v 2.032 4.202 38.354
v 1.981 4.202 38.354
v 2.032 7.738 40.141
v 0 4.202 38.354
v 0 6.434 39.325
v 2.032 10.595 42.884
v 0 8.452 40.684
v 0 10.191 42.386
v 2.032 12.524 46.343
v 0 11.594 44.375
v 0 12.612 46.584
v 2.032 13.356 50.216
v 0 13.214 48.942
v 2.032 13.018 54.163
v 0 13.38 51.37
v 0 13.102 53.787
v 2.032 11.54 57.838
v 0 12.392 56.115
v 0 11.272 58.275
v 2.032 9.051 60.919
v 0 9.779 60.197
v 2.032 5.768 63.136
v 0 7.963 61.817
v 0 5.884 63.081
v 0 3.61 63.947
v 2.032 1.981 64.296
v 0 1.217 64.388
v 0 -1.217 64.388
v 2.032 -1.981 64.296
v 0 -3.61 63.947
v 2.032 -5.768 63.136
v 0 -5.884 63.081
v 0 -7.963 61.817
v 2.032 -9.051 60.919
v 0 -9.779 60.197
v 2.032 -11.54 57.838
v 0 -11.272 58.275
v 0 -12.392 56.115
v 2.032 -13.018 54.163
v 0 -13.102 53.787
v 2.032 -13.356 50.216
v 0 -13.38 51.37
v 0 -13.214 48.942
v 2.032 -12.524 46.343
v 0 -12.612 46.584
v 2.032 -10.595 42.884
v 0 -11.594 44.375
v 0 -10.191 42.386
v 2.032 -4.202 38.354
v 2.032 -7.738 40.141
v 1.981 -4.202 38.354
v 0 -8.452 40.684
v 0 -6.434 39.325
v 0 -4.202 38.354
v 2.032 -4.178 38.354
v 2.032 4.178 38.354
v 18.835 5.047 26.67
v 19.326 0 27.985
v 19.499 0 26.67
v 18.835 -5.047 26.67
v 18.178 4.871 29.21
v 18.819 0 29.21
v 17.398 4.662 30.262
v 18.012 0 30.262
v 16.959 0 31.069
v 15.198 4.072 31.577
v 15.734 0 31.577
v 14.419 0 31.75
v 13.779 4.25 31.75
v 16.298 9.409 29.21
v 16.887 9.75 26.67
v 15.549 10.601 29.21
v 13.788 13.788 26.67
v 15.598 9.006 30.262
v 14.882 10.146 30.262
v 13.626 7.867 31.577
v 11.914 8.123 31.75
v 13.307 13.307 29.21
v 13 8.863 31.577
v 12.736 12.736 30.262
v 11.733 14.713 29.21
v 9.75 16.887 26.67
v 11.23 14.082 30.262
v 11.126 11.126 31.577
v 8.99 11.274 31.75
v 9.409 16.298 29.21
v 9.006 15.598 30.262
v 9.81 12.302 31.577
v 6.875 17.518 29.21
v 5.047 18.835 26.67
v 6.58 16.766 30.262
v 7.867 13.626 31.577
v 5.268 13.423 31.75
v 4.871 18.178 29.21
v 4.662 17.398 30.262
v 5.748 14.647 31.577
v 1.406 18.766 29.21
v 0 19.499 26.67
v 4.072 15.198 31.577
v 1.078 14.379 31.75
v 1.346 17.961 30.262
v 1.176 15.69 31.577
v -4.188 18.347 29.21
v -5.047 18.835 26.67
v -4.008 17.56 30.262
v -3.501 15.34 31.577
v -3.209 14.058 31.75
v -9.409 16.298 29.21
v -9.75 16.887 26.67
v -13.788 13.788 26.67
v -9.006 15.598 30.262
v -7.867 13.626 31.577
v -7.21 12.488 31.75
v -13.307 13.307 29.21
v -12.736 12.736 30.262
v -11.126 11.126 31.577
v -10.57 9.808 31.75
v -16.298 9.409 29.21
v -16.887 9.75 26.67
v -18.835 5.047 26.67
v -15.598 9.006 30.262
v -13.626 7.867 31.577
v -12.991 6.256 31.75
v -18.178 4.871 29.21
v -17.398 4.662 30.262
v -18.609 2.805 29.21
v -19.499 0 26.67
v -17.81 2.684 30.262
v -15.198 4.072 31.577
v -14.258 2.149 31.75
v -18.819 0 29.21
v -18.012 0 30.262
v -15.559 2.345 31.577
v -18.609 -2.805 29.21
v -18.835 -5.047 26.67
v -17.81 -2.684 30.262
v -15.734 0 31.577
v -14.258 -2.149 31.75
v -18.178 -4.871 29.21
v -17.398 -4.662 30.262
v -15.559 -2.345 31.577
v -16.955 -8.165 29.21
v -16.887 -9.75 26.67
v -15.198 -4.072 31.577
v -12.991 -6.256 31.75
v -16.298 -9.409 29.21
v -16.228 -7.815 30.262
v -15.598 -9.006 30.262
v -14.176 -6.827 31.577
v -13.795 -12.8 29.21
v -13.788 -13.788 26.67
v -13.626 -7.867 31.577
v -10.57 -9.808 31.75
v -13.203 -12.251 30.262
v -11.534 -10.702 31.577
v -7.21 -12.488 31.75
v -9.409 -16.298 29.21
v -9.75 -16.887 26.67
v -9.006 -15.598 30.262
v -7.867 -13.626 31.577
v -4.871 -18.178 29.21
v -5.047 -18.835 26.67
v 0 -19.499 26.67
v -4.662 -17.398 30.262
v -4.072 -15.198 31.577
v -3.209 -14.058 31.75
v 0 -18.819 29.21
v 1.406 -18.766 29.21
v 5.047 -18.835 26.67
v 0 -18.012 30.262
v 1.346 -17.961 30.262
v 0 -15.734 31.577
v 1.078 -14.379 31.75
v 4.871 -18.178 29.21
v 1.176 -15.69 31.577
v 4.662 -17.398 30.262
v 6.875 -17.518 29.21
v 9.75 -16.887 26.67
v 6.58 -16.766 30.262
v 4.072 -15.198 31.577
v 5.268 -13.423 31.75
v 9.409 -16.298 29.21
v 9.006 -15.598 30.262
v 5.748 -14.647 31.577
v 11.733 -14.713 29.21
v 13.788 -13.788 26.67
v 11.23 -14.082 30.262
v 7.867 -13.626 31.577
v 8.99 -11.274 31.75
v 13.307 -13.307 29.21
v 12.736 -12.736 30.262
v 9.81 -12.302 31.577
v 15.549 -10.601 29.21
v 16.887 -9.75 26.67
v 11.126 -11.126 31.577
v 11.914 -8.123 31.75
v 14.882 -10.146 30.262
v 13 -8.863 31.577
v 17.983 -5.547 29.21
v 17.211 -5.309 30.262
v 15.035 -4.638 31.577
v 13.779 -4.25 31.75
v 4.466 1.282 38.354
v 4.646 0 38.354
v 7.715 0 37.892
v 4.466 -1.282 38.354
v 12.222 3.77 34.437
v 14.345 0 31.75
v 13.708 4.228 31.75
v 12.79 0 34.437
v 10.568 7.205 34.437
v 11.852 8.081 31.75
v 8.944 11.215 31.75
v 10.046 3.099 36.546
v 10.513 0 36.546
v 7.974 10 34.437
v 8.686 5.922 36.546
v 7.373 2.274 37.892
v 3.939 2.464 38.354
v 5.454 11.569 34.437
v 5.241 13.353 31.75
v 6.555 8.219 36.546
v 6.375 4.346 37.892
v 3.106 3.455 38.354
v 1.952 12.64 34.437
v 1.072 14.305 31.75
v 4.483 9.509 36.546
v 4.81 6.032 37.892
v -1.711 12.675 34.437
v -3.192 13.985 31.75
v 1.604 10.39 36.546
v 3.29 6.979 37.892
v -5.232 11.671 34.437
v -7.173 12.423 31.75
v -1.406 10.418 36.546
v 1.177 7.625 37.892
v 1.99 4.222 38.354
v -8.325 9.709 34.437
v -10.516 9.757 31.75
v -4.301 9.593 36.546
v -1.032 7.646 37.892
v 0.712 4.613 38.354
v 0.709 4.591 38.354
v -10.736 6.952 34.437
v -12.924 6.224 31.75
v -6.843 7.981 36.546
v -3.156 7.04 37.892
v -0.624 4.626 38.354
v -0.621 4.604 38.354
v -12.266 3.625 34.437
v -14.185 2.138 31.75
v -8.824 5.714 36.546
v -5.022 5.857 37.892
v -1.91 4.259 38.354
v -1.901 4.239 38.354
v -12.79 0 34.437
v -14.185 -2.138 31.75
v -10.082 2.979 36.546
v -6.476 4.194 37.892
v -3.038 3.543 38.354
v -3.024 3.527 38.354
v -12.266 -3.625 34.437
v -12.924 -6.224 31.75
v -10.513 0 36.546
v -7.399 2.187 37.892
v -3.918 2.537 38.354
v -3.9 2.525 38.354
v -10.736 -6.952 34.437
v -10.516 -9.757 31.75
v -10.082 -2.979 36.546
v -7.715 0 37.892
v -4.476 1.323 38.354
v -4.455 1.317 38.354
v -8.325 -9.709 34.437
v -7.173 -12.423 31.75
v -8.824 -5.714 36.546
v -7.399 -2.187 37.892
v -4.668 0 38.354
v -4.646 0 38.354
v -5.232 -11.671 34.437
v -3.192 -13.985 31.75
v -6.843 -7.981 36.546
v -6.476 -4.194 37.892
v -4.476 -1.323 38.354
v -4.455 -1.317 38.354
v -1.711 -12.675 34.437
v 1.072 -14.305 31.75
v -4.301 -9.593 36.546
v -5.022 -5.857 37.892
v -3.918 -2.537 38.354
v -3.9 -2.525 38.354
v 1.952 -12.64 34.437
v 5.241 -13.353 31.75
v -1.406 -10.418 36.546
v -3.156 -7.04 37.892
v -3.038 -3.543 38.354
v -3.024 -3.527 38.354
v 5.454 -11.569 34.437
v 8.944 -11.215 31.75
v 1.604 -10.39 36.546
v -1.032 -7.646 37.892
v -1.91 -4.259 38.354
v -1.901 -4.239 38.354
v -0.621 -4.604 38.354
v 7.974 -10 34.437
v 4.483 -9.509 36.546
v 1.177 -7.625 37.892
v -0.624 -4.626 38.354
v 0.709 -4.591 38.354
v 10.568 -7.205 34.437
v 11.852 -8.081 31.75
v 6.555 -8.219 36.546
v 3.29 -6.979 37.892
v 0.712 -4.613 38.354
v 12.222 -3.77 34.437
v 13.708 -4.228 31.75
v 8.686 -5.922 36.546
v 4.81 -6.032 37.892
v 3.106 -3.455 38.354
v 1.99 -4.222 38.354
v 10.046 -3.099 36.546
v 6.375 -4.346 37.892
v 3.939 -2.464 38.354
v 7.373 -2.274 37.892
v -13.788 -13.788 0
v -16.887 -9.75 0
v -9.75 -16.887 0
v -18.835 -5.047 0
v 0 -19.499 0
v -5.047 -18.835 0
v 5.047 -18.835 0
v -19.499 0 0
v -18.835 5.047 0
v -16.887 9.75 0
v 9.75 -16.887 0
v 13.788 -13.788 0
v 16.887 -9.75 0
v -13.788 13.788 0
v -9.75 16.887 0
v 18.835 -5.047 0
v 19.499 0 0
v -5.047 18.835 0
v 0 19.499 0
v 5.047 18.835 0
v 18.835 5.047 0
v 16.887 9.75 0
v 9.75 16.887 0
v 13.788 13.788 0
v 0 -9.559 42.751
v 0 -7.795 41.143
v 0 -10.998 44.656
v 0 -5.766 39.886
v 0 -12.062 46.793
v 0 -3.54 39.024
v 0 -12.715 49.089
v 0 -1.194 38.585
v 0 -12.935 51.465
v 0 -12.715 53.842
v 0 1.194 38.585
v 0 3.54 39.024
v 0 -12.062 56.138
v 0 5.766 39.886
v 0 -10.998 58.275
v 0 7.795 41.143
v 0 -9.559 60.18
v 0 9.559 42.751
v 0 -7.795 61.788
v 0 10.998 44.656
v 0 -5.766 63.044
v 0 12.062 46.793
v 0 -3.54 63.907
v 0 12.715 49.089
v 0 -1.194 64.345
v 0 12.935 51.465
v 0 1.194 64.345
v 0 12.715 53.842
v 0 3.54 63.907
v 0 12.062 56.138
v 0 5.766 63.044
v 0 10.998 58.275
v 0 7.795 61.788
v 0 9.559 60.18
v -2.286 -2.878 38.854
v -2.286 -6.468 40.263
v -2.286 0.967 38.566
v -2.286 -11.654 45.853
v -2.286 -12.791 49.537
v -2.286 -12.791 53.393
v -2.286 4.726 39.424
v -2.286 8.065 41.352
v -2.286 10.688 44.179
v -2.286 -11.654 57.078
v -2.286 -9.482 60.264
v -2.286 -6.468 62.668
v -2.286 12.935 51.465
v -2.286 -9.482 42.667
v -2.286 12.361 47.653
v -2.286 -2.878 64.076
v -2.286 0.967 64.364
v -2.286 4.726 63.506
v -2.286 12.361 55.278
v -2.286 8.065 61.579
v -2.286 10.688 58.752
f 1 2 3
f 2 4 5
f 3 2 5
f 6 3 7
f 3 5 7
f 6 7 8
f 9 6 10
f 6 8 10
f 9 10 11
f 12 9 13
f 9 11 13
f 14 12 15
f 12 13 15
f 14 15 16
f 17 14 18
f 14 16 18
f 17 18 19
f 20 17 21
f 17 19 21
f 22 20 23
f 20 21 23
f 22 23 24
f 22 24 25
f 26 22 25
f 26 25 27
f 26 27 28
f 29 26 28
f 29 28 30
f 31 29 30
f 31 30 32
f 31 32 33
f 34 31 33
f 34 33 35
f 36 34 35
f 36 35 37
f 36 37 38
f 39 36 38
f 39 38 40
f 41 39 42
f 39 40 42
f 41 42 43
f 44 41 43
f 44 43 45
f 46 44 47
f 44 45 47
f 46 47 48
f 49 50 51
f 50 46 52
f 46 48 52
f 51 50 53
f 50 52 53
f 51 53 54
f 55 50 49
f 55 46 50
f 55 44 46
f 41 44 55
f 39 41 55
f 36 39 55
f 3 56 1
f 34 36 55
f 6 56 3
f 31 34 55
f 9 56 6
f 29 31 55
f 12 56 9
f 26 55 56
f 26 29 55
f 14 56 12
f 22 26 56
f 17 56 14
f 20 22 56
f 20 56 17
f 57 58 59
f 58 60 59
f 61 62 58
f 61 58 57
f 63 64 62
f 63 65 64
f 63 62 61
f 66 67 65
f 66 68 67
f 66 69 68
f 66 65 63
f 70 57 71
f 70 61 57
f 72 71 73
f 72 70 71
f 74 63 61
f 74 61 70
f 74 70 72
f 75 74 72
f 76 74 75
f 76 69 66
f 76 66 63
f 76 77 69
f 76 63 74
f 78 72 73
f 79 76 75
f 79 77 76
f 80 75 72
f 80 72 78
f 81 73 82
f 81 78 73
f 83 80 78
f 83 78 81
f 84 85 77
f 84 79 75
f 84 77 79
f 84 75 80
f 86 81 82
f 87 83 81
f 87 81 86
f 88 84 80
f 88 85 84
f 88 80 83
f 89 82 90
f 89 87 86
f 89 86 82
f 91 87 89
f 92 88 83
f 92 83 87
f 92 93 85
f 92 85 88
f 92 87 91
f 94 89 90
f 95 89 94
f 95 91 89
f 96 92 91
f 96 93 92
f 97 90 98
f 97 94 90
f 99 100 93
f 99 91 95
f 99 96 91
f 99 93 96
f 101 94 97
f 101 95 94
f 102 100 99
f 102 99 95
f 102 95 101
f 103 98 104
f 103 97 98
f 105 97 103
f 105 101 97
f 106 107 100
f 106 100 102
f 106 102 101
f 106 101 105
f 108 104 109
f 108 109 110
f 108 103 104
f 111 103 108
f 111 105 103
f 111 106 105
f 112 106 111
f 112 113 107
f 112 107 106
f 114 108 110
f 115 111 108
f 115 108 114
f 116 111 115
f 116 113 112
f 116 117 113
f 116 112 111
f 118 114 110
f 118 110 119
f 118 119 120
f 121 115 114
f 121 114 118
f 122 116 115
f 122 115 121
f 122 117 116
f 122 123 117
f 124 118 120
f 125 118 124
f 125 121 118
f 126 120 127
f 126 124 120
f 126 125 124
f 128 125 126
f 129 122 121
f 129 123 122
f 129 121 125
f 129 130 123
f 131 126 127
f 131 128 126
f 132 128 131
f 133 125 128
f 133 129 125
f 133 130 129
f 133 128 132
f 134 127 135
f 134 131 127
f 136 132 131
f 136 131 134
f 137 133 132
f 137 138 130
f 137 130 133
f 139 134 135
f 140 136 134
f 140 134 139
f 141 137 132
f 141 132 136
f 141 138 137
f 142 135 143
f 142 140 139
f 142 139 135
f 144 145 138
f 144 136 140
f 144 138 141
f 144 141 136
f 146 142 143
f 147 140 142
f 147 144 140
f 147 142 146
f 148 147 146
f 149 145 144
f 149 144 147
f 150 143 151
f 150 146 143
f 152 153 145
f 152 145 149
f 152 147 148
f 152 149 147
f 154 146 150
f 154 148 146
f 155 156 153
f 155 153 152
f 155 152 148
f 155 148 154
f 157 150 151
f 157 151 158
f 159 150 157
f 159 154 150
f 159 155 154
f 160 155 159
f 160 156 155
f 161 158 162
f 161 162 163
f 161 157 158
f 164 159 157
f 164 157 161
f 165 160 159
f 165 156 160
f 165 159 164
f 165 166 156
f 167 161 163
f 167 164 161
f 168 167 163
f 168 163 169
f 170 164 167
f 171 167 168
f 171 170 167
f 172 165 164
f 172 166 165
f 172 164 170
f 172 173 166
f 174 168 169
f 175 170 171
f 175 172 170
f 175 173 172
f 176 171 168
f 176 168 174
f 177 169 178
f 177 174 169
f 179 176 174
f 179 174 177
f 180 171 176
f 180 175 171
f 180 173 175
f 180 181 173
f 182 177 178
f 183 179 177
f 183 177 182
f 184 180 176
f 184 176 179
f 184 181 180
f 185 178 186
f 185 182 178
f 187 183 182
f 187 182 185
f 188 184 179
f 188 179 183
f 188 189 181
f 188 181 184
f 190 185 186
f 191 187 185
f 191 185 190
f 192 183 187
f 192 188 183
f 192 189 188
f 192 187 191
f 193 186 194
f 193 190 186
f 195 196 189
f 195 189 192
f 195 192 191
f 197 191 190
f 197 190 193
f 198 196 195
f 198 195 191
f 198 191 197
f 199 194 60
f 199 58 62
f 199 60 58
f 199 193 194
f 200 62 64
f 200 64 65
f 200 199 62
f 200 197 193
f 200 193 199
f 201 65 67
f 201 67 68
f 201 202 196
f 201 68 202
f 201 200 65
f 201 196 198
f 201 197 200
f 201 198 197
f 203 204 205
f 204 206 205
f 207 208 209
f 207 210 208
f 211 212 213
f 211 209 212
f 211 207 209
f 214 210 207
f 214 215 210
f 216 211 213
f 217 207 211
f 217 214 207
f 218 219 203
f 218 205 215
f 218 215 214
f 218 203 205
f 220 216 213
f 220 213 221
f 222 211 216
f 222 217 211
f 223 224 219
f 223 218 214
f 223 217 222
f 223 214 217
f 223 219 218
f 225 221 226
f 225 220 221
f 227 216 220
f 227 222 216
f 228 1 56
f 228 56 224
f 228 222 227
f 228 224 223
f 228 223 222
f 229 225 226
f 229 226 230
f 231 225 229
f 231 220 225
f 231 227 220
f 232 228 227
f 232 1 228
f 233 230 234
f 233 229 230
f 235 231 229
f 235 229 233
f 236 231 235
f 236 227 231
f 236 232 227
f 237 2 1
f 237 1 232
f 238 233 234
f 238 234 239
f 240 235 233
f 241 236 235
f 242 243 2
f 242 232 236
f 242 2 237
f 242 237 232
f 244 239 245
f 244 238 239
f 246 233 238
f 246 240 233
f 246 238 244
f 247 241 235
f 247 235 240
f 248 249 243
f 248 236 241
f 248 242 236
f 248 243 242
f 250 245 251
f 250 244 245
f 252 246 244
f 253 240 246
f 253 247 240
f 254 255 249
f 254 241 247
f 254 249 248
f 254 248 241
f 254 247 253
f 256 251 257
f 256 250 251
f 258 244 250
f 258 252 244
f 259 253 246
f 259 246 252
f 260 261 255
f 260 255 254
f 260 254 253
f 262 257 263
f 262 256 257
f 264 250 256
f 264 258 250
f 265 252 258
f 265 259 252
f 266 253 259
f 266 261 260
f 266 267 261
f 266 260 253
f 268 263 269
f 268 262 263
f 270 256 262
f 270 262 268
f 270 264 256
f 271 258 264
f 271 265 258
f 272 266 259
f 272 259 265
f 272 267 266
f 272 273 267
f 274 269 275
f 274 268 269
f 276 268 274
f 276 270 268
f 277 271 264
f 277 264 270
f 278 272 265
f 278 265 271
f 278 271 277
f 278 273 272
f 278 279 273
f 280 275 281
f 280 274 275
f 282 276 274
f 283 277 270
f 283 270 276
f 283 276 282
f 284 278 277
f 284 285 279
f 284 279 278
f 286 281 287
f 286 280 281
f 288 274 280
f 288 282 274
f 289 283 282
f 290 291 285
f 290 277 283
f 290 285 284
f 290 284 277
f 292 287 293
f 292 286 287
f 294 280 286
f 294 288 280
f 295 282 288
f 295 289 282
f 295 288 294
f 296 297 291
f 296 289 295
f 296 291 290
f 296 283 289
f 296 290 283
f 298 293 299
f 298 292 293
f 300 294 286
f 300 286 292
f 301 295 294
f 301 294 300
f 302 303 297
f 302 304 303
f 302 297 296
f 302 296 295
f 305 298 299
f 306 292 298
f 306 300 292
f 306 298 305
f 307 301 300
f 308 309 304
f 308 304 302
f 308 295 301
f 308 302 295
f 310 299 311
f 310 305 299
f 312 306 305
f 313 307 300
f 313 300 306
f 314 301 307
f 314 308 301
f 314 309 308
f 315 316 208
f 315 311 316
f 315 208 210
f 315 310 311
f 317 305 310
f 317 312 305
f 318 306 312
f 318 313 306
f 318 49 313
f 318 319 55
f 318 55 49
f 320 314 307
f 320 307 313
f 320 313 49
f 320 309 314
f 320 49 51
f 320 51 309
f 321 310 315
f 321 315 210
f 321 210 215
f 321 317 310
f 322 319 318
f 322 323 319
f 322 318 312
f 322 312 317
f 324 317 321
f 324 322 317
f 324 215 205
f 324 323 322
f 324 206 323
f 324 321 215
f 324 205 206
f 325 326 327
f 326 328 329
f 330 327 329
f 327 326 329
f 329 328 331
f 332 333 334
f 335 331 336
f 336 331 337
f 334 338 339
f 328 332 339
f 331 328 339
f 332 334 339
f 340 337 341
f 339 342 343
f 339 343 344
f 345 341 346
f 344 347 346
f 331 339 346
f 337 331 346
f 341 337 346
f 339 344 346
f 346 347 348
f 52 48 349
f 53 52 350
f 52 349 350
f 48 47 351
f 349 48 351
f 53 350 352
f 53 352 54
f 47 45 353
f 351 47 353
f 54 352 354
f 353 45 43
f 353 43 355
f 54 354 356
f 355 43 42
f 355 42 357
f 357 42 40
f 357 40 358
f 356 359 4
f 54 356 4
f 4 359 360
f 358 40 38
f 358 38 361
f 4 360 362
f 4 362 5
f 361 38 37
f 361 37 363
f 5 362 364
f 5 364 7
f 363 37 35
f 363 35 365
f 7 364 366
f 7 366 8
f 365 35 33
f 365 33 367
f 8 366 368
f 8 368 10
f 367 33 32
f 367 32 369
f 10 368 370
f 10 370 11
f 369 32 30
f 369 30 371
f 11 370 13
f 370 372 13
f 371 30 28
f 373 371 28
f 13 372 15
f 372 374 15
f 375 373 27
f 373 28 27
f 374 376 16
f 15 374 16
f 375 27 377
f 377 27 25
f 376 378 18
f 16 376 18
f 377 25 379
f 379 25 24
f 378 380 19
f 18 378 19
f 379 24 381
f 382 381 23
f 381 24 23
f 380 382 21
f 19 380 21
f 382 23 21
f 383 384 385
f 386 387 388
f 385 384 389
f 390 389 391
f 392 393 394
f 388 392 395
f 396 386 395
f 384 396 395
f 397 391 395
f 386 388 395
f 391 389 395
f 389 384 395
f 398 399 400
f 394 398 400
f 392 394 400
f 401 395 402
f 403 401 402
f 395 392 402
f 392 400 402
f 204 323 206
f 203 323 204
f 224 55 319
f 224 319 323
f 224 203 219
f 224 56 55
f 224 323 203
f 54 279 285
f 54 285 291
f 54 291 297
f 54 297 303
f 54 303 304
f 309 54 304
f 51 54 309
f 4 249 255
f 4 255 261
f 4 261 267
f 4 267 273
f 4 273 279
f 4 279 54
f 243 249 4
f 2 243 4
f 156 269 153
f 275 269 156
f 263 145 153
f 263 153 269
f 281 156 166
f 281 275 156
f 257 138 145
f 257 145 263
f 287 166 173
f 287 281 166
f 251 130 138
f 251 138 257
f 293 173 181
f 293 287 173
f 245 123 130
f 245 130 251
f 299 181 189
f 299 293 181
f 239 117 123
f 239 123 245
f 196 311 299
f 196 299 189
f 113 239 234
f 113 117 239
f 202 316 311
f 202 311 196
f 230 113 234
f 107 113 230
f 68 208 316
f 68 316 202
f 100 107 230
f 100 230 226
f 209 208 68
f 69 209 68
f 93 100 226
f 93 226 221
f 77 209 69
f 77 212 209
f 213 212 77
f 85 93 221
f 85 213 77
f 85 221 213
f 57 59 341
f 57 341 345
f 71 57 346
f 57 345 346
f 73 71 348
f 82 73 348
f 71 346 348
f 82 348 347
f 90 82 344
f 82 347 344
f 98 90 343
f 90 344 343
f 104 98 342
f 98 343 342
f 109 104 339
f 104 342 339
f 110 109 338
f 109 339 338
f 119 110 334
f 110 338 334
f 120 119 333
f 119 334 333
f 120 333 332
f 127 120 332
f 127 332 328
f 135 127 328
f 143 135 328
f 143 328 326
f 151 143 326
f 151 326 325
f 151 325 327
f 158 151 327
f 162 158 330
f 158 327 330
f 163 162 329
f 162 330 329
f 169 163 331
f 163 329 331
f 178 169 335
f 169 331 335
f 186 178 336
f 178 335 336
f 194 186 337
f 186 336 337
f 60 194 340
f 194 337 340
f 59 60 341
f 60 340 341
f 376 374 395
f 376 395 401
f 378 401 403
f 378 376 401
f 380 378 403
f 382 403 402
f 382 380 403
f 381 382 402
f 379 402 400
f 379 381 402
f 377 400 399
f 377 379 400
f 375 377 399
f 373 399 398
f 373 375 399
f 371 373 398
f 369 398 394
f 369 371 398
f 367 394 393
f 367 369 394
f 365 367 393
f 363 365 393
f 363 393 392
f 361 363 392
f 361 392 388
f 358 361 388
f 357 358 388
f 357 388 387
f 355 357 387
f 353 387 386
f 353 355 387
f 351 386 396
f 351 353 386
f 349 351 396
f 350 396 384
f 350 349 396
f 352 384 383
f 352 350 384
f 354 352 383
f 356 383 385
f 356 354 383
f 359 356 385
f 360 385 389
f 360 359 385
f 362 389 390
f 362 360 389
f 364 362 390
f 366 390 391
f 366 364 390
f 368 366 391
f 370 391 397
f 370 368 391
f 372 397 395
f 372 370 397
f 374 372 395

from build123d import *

# Parameters (mm, degrees)
F0_R     = 19.4994564254
F1_DEPTH = 31.75
F2_R     = 5.08
F3_R     = 14.3450562753
F4_DEPTH = 38.354
F6_R     = 13.3830864671
F7_DEPTH = 2.032
F8_R     = 12.9352143756
F9_DEPTH = 2.286


# Not quite as in the source:
# - a fillet or chamfer that OpenCascade refuses, or shapes differently, is made with other operations: its cross-section is extruded or revolved along the edge and cut away or added


with BuildPart() as f1:
    # F0 (on Top) → F1 (new body)
    with BuildSketch(Plane.XY):
        Circle(F0_R)
    extrude(amount=F1_DEPTH)

    # F2
    f2_edges = [f1.edges().sort_by_distance(p)[0] for p in [
        (-19.499456, 0, 31.75),
    ]]
    fillet(f2_edges, radius=F2_R)

    # F3 (on Top) → F4 (join)
    with BuildSketch(Plane.XY):
        Circle(F3_R)
    extrude(amount=F4_DEPTH)

    # F5: fillet of radius 10.4245741623 on 1 edges, made by hand

    # F5_s1 → F5_t2 (revolve, cut)
    with BuildSketch(Plane.XZ):
        with BuildLine():
            ThreePointArc((14.3450562753, 31.75), (10.5128533097, 36.5462583521), (4.6458315879, 38.354))
            Line((4.6458315879, 38.354), (14.3450562753, 38.354))
            Line((14.3450562753, 38.354), (14.3450562753, 31.75))
        make_face()
    revolve(axis=Axis((0, 0, 38.354), (0, 0, 1)), mode=Mode.SUBTRACT)

    # F6 (on Right) → F7 (join)
    with BuildSketch(Plane.YZ):
        with Locations((0, 51.0602071881)):
            Circle(F6_R)
    extrude(amount=F7_DEPTH)

    # F8 (on Right) → F9 (join)
    with BuildSketch(Plane.YZ):
        with Locations((0, 51.4653660357)):
            Circle(F8_R)
    extrude(amount=-F9_DEPTH)


solid = f1.part
